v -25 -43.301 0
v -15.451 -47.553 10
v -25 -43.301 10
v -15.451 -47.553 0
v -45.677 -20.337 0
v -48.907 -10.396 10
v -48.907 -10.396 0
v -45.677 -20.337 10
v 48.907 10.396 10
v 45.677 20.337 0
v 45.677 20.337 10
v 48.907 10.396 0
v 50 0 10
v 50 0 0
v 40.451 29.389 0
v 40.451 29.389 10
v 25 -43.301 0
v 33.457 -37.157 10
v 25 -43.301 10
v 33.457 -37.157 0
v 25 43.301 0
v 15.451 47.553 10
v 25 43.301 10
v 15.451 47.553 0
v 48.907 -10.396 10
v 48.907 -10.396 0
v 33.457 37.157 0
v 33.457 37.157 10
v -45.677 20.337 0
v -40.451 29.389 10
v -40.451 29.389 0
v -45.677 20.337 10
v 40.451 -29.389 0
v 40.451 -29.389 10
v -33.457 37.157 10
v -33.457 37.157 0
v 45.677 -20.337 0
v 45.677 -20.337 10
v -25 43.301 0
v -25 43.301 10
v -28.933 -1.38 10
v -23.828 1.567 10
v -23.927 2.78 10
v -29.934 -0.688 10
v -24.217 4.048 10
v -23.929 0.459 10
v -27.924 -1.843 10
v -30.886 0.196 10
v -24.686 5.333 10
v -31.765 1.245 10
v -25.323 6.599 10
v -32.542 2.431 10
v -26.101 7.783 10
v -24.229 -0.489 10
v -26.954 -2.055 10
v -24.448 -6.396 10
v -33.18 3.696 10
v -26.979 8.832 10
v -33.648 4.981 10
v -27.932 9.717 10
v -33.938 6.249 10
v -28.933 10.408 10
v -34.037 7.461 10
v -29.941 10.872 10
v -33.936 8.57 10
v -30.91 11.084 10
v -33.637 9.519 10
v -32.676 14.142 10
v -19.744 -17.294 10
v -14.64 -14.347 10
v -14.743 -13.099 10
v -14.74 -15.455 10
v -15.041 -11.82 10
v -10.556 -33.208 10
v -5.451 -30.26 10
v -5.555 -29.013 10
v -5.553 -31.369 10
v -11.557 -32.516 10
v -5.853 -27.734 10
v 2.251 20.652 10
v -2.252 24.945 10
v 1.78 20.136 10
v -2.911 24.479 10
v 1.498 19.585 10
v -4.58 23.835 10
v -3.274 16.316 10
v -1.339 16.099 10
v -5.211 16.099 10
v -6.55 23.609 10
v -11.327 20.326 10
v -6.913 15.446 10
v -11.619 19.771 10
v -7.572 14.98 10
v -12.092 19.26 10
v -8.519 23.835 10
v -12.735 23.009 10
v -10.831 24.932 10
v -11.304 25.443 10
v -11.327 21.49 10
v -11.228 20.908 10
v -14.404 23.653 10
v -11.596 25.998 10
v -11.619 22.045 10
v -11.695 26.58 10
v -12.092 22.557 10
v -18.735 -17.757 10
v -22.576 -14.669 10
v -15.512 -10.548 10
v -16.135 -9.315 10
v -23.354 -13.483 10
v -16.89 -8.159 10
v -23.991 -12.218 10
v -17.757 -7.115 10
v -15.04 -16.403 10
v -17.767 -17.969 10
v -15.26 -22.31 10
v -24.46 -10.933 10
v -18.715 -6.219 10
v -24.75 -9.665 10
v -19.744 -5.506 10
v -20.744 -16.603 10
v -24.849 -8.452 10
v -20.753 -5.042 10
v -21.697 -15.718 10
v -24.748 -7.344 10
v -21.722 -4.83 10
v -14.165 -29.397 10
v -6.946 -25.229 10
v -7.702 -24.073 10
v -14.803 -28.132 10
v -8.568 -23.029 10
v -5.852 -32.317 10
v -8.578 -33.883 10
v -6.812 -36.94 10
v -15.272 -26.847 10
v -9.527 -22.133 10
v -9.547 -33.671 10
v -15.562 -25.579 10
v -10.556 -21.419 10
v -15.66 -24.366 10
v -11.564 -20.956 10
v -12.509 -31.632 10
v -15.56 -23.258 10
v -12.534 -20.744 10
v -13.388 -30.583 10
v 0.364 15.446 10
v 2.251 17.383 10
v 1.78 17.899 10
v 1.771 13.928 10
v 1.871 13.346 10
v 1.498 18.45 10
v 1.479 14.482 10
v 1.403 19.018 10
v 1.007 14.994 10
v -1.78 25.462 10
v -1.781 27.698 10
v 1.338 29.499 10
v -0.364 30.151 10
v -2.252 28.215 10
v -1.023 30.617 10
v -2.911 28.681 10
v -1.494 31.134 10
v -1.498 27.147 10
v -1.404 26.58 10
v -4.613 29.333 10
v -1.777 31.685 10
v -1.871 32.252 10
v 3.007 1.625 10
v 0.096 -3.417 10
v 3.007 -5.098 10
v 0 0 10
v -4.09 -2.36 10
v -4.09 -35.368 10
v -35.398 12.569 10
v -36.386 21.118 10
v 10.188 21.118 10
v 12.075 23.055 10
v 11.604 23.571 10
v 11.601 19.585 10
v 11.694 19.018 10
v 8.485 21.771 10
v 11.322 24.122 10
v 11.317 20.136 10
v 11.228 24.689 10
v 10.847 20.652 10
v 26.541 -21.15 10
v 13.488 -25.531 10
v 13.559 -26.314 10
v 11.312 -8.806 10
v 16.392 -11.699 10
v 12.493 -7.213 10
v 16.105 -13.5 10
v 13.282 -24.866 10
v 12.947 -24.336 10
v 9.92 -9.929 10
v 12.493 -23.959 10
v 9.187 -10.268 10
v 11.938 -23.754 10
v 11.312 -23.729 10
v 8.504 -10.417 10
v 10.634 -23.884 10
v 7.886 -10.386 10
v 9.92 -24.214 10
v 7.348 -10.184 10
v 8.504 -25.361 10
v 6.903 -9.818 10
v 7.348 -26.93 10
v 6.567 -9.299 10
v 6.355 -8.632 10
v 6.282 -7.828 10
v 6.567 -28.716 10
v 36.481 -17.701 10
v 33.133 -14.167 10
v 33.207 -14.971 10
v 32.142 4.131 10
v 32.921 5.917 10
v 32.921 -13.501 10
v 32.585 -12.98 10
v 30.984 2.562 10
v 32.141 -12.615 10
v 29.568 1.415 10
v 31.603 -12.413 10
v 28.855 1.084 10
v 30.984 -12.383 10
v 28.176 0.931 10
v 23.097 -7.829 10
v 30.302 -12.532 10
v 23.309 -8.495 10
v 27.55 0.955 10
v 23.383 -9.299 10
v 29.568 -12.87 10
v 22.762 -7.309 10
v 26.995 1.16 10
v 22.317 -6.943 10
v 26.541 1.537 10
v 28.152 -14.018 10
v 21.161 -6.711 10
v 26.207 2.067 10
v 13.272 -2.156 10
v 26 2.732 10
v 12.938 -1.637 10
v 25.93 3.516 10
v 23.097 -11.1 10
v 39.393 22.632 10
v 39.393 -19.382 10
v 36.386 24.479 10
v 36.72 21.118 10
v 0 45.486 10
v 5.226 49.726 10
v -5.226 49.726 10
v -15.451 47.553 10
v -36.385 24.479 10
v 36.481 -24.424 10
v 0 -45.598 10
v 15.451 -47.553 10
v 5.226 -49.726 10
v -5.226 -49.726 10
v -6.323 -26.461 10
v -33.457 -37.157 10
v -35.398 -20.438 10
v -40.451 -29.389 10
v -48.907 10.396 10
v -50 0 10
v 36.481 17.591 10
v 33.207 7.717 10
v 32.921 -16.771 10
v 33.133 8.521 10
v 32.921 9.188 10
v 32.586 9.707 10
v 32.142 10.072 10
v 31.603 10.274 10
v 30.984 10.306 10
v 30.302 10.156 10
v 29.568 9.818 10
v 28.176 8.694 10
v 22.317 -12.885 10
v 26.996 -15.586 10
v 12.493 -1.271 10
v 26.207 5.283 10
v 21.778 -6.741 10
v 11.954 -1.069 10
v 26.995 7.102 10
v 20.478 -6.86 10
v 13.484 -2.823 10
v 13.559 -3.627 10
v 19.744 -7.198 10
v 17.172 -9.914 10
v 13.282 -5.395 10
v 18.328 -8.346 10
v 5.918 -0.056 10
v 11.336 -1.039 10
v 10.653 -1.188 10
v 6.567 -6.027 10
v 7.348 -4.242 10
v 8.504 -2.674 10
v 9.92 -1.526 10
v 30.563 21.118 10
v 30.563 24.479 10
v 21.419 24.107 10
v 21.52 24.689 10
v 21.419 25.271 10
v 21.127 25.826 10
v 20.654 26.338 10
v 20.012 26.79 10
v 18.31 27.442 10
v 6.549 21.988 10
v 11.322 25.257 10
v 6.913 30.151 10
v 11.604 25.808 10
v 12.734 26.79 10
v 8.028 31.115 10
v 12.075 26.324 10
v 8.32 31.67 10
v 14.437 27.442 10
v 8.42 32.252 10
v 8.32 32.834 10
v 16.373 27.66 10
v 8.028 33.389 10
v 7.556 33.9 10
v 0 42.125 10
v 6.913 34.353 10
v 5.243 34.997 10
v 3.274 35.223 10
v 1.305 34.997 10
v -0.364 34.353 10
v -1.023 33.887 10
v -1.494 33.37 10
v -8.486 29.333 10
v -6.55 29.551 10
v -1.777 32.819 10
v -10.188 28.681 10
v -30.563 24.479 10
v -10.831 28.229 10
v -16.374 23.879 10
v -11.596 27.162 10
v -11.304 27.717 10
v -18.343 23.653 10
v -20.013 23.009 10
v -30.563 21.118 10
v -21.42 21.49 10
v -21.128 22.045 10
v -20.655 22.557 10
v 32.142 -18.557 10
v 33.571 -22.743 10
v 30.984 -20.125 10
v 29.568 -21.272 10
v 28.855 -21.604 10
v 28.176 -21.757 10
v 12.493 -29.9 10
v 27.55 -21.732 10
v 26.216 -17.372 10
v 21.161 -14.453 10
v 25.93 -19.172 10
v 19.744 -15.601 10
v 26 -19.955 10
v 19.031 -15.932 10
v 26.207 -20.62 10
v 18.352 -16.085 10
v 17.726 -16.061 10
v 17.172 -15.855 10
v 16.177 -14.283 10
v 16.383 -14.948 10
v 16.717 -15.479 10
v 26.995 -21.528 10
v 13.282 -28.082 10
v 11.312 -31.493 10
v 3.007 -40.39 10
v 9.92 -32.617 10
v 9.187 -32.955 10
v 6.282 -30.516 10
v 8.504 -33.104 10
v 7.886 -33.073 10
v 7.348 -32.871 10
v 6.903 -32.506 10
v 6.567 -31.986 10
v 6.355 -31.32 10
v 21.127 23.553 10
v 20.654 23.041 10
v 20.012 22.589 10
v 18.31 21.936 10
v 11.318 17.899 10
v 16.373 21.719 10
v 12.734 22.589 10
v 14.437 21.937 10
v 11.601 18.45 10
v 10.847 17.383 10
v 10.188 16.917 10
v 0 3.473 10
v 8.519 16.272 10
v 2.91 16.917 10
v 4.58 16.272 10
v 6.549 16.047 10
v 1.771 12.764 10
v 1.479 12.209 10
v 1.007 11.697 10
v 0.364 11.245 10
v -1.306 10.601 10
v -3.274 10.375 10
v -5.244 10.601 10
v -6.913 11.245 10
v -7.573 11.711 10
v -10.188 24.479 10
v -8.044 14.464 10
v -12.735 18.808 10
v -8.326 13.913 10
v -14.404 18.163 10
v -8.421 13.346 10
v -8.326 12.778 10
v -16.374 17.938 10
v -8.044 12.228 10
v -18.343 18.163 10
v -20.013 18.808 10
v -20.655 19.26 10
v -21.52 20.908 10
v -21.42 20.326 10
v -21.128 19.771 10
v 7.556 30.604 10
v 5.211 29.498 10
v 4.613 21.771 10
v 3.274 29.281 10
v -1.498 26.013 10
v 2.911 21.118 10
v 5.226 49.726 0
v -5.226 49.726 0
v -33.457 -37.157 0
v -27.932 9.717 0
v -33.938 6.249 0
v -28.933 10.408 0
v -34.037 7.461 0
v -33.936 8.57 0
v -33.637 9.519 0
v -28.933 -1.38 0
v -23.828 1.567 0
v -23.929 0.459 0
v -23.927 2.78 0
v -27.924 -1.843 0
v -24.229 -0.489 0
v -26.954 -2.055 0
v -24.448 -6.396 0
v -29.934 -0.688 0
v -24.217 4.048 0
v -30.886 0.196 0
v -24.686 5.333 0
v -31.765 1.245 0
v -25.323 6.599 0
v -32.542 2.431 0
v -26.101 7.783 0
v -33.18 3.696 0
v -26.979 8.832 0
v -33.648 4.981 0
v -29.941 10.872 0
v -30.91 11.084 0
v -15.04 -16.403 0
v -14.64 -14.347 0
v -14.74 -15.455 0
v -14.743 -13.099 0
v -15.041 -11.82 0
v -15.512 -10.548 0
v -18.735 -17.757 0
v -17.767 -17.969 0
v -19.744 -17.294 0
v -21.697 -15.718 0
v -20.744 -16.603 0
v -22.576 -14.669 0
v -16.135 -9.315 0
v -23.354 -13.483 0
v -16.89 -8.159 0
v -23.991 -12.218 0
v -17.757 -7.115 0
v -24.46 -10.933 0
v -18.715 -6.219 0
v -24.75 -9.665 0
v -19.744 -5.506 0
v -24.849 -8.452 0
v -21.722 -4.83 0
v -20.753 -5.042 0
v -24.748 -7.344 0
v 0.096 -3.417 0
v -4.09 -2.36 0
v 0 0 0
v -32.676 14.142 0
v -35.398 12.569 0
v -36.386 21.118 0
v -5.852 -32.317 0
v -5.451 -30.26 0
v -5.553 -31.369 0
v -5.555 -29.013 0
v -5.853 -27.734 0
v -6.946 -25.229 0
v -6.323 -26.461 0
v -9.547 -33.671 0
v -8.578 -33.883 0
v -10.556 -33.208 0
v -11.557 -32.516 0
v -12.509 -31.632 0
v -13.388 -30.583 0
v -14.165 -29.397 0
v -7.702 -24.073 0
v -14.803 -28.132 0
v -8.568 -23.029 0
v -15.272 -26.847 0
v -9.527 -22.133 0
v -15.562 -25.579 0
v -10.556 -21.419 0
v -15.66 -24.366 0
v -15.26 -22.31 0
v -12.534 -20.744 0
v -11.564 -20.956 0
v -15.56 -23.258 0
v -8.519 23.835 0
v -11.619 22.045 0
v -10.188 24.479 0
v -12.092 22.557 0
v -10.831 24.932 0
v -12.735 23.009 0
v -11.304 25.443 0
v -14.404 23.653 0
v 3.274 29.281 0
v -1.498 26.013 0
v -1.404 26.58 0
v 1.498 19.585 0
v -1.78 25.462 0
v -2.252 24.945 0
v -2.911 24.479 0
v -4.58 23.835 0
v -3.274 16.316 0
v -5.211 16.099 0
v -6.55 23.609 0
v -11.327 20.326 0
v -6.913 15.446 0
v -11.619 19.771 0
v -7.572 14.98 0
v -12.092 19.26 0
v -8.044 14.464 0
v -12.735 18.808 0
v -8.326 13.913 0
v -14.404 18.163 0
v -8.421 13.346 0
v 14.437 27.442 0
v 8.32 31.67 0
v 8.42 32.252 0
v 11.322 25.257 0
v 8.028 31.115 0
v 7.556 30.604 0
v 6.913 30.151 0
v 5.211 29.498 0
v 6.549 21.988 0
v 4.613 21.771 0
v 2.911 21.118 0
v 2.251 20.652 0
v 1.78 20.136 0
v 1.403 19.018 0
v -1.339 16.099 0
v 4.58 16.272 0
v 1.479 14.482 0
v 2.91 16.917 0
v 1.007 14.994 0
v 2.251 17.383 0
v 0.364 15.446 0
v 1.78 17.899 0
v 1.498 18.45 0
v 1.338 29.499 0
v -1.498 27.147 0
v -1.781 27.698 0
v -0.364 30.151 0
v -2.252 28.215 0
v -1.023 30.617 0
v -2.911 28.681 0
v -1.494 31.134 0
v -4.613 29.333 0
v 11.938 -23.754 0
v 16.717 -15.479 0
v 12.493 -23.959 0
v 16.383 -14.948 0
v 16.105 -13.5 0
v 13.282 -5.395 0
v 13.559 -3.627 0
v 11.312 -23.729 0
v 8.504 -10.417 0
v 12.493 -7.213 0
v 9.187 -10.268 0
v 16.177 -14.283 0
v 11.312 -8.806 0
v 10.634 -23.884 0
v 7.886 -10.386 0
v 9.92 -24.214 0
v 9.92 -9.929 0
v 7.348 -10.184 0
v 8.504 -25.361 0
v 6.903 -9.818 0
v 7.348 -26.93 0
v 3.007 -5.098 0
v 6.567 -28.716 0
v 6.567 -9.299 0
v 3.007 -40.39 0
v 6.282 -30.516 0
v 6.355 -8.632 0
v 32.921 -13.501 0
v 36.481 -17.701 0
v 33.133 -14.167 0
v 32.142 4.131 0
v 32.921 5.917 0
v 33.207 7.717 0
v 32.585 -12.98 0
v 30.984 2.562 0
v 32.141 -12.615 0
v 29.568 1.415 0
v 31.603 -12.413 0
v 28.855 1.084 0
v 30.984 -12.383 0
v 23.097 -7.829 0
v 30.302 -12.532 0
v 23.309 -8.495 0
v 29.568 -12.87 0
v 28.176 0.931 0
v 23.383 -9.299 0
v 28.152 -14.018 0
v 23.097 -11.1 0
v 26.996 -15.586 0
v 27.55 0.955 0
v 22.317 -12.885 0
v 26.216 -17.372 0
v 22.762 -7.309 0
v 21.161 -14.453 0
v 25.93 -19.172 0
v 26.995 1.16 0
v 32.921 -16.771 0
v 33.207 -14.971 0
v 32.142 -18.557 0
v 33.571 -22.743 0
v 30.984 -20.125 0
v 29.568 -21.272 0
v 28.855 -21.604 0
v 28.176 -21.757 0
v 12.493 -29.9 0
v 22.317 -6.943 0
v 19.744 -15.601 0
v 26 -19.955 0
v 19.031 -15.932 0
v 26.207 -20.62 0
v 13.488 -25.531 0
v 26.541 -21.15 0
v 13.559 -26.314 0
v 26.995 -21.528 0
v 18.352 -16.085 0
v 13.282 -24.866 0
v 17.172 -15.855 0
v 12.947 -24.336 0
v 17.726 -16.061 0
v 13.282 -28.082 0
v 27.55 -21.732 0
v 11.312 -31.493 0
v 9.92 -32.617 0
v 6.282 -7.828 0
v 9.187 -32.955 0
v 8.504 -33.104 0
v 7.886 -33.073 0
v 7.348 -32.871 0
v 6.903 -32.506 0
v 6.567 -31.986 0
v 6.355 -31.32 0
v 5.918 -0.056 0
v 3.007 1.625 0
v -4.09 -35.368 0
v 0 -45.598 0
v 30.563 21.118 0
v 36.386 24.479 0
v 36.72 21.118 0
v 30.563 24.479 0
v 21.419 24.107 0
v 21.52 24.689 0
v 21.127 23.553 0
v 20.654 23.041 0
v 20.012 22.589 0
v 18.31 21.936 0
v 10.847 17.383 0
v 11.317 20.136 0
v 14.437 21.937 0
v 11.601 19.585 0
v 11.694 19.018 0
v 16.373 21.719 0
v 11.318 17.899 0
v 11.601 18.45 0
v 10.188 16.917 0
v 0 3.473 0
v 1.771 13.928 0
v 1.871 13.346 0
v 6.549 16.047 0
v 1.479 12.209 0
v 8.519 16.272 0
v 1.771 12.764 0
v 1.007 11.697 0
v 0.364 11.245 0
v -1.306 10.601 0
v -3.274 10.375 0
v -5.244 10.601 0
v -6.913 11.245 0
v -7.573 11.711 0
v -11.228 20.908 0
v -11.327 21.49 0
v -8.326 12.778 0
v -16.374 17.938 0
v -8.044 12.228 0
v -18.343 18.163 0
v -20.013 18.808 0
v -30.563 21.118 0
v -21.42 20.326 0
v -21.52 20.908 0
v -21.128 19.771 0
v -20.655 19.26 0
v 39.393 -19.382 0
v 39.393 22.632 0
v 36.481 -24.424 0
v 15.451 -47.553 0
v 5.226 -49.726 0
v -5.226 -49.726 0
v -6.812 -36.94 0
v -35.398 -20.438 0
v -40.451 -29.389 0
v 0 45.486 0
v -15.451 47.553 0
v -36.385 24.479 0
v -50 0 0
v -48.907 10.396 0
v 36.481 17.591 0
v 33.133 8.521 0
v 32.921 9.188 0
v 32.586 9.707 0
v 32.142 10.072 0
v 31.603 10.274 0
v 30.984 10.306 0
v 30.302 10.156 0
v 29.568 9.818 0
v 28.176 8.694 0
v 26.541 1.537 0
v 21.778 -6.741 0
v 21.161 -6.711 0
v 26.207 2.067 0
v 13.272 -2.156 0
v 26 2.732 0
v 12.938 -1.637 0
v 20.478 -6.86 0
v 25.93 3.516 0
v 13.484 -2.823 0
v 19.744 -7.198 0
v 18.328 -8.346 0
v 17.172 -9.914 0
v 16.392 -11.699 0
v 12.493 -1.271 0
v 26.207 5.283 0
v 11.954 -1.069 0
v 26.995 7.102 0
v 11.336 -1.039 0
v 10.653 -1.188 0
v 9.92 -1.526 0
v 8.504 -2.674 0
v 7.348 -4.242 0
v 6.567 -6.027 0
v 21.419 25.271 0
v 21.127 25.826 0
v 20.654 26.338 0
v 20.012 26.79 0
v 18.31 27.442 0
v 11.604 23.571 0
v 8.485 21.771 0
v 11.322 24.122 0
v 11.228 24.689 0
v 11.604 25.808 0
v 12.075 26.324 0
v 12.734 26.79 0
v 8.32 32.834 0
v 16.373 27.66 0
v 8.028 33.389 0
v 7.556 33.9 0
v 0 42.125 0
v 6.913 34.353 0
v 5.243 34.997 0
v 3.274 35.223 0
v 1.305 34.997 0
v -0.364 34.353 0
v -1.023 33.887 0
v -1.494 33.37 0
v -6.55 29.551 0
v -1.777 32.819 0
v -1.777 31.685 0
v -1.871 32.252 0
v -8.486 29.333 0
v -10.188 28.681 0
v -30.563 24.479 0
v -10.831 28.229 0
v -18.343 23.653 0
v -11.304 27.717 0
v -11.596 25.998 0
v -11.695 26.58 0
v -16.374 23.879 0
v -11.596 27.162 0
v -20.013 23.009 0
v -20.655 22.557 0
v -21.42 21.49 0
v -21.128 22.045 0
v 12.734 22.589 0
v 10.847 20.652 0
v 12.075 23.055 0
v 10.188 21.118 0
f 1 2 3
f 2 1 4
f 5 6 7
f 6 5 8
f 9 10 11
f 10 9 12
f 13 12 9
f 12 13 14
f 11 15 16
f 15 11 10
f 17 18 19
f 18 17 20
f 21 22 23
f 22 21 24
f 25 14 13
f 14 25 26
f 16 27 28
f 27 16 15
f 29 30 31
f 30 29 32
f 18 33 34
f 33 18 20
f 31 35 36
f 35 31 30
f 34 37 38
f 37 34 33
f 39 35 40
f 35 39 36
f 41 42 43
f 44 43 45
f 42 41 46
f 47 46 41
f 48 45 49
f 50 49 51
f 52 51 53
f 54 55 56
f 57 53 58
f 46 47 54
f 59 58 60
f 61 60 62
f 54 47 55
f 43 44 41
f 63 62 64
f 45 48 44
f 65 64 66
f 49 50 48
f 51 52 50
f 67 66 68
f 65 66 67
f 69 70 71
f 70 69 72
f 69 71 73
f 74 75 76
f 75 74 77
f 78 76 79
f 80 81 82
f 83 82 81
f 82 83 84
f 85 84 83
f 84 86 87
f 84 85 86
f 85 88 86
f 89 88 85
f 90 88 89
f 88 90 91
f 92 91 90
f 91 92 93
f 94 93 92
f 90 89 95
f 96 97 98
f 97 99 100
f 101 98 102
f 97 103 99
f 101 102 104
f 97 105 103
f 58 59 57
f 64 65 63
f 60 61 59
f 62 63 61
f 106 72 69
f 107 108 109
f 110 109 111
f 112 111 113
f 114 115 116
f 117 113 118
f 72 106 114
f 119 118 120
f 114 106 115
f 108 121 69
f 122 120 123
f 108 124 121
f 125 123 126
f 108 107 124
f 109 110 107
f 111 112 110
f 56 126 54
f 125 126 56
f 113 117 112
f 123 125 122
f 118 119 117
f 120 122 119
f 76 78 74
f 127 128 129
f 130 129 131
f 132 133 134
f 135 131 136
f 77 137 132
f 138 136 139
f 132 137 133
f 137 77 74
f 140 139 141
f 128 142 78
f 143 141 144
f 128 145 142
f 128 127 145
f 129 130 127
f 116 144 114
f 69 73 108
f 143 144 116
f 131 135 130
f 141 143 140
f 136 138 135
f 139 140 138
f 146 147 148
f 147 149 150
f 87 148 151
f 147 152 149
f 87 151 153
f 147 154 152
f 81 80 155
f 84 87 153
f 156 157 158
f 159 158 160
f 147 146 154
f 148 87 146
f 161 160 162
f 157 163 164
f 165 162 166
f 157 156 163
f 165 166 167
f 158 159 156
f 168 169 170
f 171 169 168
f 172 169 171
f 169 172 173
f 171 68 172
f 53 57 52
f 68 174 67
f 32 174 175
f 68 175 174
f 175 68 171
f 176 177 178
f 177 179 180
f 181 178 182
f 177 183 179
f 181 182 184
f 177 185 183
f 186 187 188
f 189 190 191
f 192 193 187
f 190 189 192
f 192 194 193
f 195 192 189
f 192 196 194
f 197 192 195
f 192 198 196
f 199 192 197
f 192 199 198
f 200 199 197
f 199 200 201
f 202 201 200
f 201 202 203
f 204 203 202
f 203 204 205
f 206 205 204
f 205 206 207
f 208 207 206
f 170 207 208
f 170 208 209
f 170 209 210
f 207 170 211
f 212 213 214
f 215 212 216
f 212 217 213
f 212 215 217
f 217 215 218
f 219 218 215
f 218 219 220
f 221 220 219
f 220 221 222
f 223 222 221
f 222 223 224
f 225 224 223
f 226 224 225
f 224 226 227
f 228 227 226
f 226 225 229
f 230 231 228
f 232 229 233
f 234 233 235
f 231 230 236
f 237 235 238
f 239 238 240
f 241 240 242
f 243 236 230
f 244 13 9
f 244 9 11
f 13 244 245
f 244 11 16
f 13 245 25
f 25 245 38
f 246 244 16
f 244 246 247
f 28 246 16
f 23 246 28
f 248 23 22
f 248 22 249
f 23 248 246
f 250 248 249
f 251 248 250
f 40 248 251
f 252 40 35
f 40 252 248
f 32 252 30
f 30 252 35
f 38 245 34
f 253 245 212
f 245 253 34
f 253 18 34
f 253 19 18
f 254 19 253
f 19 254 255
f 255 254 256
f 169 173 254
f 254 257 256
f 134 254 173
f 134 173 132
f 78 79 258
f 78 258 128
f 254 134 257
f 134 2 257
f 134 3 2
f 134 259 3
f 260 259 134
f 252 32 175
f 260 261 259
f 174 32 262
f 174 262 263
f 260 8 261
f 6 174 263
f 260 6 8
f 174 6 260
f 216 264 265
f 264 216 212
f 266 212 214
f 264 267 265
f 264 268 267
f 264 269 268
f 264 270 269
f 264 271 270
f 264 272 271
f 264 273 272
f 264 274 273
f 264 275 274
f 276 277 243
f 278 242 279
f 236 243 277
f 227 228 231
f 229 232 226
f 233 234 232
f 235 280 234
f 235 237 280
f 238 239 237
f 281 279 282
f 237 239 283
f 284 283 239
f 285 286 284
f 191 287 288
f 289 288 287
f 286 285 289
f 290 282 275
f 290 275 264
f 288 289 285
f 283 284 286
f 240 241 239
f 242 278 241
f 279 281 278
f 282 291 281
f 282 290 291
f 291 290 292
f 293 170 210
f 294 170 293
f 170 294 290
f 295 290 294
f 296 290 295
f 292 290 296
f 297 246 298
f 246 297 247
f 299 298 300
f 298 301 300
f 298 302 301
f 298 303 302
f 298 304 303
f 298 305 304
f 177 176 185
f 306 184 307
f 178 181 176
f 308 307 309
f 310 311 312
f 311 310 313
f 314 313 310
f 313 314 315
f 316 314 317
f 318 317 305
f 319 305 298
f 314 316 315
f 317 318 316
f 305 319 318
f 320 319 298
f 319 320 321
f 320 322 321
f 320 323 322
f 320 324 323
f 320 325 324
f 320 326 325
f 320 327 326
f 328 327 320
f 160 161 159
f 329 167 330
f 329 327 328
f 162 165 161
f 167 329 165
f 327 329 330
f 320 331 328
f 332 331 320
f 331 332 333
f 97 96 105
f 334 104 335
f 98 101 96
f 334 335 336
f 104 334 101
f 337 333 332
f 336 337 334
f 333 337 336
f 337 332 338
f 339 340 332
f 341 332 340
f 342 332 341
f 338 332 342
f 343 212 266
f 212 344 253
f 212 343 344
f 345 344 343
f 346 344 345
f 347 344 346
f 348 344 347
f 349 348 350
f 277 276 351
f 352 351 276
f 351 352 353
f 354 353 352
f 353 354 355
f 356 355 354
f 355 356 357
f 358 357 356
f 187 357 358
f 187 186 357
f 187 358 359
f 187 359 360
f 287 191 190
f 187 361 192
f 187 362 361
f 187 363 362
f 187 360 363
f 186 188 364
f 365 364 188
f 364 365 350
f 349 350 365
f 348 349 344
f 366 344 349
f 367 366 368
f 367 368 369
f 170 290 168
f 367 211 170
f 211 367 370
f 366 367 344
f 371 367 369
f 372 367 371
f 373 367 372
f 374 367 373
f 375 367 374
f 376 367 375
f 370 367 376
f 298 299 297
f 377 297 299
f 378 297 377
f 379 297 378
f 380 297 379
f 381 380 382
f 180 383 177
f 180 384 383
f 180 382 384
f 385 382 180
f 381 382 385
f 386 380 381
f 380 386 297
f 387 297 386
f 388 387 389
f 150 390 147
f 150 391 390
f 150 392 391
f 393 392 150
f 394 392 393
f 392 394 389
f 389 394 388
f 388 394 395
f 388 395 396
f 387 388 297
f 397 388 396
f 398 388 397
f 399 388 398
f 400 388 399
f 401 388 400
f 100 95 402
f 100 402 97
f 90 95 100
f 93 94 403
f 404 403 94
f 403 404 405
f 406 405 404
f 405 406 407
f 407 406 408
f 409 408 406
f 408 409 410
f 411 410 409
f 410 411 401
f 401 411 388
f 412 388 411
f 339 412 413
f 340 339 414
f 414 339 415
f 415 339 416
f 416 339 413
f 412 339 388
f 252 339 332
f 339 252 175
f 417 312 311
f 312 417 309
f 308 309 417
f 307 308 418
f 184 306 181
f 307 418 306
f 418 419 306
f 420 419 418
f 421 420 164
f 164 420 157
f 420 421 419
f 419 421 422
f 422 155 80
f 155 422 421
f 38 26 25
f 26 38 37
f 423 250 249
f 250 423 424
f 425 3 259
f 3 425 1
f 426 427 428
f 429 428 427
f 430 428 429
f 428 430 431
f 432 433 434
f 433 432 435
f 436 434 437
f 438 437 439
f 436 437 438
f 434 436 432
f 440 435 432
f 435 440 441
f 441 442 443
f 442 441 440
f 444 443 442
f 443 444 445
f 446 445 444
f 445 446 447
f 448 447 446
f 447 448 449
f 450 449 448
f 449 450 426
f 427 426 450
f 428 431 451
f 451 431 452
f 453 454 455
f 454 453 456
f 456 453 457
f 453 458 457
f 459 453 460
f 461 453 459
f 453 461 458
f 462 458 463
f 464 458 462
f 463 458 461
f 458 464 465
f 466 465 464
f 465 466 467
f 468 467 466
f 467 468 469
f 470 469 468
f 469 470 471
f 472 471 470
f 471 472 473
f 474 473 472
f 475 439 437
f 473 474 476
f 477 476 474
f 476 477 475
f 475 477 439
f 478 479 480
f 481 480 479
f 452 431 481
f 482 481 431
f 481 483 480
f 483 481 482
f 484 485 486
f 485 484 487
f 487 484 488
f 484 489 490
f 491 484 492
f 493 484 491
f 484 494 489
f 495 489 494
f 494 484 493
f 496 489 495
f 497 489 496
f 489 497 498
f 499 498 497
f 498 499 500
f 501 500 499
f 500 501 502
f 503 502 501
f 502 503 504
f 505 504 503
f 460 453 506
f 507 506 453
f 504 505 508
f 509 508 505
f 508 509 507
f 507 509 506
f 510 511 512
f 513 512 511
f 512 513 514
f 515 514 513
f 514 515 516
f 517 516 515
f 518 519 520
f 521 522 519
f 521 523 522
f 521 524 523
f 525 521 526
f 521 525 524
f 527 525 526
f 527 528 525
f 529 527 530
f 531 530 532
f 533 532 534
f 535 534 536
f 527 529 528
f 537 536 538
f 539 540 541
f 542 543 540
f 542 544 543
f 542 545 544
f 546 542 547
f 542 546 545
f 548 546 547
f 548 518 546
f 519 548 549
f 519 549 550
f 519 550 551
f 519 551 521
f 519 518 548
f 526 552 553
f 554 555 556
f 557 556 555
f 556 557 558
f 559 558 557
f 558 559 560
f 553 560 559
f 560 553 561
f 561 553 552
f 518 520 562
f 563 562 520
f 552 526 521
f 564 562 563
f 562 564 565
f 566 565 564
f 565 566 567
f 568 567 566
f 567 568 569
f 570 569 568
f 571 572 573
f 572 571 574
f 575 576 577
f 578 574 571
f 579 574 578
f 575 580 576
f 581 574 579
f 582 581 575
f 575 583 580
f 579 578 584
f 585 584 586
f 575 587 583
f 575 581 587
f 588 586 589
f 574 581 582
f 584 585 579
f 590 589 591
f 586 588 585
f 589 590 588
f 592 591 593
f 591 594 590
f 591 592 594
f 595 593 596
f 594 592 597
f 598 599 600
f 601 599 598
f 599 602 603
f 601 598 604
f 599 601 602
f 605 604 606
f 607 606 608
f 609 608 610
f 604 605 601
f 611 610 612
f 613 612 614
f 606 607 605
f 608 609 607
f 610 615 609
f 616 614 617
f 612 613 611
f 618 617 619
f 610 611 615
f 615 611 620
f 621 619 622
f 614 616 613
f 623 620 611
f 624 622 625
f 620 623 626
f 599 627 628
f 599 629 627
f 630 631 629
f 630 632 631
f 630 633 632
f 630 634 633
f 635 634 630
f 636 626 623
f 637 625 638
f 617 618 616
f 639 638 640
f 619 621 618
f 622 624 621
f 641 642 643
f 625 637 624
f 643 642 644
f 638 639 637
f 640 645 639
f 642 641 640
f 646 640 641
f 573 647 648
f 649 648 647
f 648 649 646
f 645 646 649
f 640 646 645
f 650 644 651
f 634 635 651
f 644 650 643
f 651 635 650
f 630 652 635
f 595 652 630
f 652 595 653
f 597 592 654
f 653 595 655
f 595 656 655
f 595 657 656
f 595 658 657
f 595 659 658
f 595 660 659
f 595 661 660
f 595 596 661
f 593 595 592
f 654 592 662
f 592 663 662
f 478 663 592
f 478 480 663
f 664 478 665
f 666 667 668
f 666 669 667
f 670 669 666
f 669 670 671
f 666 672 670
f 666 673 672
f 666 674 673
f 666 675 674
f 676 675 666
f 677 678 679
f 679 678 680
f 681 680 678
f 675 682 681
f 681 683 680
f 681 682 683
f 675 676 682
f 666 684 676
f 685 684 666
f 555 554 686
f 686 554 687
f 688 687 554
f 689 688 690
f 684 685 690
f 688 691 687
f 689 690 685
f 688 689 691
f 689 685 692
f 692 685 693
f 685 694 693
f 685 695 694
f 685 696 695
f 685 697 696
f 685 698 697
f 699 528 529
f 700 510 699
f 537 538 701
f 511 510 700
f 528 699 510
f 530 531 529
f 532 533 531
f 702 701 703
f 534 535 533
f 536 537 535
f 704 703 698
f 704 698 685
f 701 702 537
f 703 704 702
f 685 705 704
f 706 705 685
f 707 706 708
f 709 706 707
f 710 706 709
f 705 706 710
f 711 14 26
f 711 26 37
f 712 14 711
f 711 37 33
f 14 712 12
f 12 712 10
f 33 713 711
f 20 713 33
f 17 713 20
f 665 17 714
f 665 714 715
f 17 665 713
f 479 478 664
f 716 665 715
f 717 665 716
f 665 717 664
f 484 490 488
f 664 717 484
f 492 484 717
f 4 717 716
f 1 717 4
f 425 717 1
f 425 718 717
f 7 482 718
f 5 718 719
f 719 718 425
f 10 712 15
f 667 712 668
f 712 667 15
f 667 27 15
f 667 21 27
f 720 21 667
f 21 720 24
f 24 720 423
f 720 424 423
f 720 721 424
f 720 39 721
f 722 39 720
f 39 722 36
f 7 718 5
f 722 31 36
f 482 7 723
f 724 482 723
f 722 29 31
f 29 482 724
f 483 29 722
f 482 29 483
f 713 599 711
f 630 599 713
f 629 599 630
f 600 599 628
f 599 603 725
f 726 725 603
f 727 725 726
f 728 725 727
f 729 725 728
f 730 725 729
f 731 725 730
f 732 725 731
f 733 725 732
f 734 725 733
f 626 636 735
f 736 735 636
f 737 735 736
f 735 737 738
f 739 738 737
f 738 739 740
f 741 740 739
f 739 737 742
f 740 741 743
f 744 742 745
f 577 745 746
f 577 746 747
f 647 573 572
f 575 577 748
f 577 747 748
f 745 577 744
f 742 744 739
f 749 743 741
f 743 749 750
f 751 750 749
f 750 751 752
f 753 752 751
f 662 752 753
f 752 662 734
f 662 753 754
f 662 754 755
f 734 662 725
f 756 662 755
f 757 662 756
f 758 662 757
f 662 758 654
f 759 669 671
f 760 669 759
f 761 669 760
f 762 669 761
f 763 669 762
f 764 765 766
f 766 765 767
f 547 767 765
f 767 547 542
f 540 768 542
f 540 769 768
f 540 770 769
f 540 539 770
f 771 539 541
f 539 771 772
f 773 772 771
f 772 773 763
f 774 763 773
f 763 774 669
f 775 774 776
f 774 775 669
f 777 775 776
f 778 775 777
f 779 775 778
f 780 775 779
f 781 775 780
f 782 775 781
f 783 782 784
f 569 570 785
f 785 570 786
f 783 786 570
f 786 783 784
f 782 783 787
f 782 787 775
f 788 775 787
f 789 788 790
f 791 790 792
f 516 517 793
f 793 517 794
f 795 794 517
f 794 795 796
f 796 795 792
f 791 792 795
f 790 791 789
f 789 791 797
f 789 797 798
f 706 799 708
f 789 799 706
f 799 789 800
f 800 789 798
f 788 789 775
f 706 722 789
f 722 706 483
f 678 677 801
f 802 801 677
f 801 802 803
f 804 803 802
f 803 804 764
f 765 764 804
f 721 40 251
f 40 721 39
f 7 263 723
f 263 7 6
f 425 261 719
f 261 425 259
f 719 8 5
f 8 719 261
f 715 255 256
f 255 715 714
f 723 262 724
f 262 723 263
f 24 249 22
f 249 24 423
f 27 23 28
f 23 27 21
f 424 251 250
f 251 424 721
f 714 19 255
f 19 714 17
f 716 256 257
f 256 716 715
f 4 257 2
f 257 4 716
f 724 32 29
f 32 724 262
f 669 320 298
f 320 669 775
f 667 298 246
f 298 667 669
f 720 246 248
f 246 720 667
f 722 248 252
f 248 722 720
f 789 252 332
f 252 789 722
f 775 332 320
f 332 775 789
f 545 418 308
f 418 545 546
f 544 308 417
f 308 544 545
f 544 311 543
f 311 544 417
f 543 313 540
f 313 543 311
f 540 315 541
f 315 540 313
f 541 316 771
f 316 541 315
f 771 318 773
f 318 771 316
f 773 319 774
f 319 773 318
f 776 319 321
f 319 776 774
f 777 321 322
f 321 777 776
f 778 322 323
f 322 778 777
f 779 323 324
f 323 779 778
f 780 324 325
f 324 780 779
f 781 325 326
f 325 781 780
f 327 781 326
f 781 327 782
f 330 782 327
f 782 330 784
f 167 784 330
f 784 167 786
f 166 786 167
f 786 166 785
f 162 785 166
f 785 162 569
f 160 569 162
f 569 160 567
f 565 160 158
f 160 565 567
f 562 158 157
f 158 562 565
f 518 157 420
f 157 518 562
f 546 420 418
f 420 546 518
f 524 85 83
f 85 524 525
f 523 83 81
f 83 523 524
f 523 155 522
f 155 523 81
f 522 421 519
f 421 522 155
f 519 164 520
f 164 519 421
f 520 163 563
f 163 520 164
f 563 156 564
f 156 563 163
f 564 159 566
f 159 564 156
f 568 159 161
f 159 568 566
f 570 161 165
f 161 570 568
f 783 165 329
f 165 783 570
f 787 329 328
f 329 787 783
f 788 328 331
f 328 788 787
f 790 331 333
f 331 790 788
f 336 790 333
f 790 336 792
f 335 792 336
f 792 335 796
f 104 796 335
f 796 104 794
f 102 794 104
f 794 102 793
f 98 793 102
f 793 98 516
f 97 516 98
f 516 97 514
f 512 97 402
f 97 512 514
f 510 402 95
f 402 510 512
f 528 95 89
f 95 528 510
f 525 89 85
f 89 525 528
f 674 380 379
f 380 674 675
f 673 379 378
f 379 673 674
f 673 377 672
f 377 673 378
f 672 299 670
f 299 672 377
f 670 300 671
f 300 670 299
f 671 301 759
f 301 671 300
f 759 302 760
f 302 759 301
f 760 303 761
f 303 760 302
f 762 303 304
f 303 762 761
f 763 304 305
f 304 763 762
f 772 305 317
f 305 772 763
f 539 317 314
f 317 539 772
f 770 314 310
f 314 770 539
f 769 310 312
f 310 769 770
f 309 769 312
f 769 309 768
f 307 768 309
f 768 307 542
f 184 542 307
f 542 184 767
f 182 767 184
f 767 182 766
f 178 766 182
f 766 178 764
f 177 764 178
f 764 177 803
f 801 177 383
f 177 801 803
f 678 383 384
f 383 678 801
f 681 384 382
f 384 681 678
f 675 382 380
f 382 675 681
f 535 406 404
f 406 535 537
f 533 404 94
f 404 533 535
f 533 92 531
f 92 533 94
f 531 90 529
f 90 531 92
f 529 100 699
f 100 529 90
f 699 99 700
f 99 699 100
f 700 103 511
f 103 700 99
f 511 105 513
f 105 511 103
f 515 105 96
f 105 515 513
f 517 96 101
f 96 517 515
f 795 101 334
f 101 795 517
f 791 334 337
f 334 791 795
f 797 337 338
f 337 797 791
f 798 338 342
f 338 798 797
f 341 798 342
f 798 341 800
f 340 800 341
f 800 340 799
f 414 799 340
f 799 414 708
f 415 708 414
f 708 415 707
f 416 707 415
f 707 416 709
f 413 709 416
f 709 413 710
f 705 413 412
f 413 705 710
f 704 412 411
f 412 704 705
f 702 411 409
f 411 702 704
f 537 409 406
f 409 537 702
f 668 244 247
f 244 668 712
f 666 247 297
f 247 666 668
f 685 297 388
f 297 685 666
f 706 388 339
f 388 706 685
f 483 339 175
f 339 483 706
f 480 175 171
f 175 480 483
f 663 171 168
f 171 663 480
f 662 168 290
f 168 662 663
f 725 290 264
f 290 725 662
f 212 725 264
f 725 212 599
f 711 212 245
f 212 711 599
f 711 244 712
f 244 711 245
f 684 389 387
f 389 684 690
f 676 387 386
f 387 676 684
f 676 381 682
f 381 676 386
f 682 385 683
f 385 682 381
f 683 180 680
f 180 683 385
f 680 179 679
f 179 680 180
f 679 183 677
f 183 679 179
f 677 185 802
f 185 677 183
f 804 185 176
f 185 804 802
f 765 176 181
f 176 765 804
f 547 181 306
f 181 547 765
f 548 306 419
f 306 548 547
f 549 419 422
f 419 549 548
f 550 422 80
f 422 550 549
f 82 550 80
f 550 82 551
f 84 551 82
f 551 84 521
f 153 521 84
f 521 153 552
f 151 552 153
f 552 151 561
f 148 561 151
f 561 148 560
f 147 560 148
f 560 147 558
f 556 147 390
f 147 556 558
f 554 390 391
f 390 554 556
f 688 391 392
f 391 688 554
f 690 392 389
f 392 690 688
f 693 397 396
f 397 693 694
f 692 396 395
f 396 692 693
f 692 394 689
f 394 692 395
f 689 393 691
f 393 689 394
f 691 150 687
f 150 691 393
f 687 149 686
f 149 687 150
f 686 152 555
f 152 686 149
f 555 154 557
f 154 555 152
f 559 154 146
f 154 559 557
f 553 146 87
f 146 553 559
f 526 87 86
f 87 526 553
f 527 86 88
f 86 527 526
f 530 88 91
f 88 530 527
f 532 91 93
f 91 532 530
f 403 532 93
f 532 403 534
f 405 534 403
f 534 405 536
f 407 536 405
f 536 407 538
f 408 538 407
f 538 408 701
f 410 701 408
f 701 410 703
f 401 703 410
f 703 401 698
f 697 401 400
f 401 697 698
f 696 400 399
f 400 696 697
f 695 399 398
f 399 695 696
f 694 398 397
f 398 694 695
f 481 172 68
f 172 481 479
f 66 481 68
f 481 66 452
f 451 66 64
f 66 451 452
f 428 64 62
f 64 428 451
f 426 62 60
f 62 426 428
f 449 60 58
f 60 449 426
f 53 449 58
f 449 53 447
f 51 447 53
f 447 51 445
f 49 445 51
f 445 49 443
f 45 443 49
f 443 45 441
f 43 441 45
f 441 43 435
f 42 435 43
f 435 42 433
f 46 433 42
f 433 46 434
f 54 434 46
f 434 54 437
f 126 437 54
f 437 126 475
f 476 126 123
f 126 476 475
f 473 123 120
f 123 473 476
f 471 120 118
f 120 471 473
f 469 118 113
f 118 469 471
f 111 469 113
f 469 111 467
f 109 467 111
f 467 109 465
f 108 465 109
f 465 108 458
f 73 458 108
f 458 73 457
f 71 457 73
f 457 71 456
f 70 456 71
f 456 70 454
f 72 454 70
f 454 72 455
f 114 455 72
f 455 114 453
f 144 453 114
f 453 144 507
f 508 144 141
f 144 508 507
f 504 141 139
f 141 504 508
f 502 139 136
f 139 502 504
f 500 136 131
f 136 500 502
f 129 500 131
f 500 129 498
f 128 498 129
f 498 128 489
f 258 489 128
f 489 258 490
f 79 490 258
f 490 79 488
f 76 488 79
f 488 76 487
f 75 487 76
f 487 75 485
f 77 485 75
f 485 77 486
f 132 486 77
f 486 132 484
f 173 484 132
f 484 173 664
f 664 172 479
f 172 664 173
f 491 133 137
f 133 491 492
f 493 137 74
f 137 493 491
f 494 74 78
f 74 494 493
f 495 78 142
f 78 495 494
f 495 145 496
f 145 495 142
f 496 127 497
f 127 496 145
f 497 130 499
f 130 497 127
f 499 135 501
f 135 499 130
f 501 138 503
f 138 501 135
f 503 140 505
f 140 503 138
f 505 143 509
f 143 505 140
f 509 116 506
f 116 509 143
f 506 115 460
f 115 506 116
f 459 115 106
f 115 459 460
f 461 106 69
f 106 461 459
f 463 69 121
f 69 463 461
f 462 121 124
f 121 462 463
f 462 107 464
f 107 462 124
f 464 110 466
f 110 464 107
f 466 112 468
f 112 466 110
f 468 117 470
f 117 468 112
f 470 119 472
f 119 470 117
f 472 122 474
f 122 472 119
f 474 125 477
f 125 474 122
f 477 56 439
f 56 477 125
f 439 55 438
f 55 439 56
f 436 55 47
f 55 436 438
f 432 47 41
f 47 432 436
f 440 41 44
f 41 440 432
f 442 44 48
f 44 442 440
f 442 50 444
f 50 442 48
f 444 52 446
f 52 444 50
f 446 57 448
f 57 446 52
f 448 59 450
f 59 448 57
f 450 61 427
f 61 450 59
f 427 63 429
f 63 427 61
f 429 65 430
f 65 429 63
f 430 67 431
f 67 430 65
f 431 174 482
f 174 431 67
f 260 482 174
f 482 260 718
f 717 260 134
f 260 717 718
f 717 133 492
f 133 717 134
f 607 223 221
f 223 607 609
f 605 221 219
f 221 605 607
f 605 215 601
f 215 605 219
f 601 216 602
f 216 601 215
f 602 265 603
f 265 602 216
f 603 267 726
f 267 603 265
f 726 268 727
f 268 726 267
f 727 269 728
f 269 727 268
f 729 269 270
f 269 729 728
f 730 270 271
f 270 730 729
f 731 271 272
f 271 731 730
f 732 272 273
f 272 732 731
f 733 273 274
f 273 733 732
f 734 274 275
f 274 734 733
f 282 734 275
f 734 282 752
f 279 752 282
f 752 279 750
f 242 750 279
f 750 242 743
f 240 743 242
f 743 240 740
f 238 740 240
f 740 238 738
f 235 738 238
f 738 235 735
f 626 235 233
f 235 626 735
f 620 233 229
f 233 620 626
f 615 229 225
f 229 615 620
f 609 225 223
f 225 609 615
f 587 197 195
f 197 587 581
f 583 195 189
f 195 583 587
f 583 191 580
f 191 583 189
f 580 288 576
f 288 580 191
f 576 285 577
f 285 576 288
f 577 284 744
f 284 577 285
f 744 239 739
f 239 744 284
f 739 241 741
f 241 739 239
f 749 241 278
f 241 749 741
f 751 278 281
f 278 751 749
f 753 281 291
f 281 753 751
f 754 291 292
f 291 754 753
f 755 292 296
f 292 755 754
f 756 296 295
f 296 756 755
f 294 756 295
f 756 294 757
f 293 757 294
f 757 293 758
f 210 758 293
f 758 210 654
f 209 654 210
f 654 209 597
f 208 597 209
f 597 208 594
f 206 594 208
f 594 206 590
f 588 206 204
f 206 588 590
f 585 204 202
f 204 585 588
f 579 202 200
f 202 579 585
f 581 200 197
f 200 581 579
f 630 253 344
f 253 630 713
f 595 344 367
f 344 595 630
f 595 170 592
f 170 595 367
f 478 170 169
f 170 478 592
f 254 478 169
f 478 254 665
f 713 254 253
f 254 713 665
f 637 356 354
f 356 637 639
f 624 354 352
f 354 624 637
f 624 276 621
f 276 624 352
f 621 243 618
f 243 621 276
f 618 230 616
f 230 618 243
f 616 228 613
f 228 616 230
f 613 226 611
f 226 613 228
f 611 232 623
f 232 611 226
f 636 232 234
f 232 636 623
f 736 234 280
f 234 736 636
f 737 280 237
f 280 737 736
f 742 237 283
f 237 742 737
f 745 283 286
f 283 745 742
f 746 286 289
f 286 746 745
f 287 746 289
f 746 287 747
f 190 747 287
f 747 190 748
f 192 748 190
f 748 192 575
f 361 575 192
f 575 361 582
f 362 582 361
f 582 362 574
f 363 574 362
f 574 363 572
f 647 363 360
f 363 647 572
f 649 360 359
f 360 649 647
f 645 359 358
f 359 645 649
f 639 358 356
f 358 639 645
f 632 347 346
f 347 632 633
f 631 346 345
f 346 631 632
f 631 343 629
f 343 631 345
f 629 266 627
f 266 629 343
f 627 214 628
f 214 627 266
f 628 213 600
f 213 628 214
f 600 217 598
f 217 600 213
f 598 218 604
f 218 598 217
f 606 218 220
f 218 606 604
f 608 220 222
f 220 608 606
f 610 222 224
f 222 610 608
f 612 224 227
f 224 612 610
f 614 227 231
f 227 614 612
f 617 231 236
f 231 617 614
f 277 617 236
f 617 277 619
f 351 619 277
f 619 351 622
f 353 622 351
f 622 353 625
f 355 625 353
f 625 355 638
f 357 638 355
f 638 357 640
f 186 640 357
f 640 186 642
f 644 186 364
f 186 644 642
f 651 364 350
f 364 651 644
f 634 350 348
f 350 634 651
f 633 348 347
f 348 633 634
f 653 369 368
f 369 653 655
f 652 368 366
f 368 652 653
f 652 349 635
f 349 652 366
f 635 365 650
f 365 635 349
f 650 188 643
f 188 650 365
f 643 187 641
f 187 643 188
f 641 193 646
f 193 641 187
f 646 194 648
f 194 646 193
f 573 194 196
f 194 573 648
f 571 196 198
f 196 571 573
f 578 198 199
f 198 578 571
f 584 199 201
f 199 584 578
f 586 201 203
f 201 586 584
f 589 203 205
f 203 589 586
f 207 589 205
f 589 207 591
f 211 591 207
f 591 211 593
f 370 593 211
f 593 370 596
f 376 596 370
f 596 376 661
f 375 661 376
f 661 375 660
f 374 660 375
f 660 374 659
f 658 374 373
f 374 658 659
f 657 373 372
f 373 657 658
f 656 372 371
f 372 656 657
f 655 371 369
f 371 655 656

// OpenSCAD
difference() {
  cylinder(r = 50, h = 10);
  translate([-50, -50, -1]) linear_extrude(50) {
    import("LogoExtrude.dxf", layer="final");
  }
}
